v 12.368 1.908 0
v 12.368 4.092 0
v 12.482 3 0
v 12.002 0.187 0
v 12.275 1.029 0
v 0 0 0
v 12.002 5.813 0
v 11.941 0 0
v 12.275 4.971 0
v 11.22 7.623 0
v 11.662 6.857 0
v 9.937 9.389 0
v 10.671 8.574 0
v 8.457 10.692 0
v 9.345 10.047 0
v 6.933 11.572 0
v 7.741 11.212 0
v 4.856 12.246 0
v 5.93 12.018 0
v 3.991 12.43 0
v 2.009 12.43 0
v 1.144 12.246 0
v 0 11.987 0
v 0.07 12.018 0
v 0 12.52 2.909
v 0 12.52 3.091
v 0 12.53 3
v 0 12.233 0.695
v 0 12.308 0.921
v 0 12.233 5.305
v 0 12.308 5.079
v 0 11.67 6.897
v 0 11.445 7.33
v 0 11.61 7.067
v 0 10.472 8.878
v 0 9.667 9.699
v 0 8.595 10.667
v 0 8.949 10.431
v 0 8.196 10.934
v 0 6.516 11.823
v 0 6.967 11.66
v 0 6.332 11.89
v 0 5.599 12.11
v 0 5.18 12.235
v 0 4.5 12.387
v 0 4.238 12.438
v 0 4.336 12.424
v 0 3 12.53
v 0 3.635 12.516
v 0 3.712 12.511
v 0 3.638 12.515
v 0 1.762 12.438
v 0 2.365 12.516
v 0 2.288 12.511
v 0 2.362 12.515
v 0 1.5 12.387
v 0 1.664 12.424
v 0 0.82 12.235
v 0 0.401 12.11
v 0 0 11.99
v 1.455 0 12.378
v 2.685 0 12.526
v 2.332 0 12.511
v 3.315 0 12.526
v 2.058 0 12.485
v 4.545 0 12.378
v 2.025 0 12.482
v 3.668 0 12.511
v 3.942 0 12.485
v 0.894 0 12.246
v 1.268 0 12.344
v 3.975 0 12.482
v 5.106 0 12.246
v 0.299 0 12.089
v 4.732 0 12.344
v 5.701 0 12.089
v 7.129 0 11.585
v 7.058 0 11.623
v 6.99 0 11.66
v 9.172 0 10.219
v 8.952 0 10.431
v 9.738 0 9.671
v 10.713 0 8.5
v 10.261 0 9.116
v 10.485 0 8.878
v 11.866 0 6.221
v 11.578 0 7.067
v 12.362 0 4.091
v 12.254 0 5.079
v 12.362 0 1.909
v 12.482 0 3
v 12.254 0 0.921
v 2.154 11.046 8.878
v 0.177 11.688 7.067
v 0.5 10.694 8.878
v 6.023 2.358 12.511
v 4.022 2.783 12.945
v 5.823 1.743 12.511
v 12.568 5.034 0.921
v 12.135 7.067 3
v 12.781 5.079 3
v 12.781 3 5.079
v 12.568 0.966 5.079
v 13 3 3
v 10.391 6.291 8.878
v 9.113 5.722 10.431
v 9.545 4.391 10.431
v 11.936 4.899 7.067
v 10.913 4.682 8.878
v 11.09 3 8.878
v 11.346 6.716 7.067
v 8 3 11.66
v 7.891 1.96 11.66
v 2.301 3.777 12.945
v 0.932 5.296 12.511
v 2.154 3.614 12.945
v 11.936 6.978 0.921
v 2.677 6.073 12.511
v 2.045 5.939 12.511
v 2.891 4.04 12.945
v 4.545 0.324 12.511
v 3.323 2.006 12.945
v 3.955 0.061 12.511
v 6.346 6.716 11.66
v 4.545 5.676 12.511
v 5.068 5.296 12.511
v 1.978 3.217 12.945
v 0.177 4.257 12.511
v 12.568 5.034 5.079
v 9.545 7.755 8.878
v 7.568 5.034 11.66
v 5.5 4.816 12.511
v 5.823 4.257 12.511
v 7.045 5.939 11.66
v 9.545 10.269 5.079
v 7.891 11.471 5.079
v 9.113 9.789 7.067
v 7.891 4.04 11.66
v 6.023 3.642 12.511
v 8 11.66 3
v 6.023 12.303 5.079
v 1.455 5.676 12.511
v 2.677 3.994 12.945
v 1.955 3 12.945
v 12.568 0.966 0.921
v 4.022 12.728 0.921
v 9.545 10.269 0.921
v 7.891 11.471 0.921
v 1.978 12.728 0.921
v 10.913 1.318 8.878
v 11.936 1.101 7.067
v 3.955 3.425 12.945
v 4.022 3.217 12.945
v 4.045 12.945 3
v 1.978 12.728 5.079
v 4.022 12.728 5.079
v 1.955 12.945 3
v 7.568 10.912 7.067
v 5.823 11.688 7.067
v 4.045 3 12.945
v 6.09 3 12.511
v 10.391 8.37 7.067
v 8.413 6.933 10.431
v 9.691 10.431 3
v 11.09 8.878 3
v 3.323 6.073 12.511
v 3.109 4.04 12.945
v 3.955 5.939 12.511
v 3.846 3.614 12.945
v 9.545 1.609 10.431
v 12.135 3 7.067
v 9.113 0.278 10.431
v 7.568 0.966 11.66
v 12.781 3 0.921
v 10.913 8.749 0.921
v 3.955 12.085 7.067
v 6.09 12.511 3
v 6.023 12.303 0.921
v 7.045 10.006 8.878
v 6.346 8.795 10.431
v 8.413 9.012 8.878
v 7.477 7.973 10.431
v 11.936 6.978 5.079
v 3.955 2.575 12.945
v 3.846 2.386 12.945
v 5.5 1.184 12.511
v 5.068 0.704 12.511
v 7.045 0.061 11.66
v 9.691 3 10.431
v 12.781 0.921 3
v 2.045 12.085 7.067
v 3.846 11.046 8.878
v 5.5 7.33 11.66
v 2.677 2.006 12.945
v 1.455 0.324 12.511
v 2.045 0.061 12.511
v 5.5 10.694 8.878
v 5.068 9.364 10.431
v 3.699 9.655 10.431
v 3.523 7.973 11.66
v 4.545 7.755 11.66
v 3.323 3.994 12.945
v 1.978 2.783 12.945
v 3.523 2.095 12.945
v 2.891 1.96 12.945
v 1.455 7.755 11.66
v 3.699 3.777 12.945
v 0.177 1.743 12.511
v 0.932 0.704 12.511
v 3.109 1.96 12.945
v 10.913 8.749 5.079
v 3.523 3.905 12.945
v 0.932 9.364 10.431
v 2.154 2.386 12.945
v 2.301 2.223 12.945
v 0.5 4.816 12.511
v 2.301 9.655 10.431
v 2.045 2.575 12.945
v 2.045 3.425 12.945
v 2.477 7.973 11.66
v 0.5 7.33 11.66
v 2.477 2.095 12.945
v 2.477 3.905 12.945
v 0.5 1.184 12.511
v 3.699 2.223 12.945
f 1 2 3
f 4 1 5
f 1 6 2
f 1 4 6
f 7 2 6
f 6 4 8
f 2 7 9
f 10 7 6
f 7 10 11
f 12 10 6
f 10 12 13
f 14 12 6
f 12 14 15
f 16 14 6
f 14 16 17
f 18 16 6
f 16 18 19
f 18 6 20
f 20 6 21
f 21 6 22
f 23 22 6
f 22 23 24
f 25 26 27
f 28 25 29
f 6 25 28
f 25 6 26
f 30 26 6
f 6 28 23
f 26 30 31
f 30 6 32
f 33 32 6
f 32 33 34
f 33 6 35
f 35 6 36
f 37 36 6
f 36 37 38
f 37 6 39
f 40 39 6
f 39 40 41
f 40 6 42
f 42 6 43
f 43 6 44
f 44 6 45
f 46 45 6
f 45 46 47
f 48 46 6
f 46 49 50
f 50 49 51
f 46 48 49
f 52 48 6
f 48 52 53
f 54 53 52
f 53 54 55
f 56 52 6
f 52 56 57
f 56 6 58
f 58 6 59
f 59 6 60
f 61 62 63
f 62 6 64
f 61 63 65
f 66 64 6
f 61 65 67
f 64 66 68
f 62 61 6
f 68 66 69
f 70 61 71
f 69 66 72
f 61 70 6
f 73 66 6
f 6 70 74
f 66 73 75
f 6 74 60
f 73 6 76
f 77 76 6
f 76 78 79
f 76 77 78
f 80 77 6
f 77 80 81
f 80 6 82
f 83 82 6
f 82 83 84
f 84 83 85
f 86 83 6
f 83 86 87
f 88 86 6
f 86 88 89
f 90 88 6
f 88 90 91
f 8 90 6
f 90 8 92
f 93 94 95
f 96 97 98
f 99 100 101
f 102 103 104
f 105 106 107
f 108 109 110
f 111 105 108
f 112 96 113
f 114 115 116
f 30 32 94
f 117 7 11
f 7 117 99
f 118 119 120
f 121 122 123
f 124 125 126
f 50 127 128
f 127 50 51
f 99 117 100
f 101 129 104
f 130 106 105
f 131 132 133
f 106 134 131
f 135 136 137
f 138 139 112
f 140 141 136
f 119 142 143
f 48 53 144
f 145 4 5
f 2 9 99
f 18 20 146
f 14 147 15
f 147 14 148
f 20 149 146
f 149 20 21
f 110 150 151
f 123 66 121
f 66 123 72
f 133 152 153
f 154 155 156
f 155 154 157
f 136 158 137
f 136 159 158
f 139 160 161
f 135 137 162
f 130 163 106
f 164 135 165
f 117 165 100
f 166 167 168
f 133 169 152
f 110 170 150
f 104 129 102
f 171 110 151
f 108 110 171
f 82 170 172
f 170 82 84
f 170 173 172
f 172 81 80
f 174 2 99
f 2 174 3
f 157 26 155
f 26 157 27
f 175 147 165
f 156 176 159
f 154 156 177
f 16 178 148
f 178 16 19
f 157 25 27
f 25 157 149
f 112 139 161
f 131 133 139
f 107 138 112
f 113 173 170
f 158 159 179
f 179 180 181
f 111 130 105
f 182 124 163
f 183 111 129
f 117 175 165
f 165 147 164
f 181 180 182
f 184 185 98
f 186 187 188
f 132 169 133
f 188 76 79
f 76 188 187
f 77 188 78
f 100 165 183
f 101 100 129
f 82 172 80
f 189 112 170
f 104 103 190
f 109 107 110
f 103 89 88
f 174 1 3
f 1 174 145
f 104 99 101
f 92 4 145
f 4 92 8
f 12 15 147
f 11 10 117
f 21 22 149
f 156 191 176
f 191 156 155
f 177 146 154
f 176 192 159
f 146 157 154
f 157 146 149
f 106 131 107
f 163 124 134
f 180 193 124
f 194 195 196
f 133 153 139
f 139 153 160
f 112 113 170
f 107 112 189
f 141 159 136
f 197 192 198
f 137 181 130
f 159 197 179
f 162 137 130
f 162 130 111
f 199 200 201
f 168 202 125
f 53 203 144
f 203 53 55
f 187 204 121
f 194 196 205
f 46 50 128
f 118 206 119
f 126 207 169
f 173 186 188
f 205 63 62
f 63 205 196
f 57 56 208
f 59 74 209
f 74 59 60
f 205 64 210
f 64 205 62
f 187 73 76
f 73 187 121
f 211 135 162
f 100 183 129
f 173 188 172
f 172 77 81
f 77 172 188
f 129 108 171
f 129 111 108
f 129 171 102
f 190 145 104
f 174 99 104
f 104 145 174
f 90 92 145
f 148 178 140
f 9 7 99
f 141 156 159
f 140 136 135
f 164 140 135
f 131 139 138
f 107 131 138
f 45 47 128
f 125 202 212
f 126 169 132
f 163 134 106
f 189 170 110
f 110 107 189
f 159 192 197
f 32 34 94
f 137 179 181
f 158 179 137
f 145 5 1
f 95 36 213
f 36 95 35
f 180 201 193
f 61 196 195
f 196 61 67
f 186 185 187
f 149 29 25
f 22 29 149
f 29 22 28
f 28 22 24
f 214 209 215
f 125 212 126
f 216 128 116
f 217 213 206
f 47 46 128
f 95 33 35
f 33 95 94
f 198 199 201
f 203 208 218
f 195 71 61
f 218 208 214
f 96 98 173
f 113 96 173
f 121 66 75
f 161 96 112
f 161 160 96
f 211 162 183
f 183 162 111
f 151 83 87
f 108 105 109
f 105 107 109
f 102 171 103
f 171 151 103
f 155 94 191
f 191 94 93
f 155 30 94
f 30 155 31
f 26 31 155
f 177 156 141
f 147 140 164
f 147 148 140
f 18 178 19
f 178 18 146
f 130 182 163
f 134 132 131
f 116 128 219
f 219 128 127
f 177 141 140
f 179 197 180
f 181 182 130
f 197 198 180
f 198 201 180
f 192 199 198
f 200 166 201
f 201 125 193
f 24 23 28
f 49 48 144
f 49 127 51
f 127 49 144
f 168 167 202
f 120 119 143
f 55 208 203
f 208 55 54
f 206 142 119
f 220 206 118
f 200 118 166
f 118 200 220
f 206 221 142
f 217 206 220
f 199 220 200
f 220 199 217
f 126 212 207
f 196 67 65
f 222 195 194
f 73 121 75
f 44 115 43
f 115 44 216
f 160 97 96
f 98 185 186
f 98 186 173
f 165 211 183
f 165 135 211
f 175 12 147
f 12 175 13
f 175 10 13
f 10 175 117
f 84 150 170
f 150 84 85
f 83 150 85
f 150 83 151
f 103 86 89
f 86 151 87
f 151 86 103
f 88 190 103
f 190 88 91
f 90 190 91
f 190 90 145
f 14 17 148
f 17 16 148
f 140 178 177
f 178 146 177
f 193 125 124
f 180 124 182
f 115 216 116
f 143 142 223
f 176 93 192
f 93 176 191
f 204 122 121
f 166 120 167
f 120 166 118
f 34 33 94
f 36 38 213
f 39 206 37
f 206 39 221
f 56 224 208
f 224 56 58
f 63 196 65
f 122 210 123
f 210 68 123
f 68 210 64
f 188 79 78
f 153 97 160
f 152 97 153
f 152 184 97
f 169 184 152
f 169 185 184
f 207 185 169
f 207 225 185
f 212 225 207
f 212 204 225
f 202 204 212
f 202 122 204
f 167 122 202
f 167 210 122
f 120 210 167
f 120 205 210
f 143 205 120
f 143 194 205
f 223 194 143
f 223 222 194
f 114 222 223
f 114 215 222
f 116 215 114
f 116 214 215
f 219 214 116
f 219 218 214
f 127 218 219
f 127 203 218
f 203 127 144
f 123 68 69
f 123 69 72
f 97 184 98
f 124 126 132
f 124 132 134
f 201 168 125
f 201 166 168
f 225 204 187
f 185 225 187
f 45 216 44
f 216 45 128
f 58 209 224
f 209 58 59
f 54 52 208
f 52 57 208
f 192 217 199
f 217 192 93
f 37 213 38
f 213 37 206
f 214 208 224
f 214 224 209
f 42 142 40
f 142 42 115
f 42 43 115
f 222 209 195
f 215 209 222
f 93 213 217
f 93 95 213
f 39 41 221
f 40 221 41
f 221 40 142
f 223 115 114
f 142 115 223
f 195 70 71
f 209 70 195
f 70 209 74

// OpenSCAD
intersection() {
	cube(size=15);
	translate([3, 3, 3]) {
		sphere(r=10);
	}
}
